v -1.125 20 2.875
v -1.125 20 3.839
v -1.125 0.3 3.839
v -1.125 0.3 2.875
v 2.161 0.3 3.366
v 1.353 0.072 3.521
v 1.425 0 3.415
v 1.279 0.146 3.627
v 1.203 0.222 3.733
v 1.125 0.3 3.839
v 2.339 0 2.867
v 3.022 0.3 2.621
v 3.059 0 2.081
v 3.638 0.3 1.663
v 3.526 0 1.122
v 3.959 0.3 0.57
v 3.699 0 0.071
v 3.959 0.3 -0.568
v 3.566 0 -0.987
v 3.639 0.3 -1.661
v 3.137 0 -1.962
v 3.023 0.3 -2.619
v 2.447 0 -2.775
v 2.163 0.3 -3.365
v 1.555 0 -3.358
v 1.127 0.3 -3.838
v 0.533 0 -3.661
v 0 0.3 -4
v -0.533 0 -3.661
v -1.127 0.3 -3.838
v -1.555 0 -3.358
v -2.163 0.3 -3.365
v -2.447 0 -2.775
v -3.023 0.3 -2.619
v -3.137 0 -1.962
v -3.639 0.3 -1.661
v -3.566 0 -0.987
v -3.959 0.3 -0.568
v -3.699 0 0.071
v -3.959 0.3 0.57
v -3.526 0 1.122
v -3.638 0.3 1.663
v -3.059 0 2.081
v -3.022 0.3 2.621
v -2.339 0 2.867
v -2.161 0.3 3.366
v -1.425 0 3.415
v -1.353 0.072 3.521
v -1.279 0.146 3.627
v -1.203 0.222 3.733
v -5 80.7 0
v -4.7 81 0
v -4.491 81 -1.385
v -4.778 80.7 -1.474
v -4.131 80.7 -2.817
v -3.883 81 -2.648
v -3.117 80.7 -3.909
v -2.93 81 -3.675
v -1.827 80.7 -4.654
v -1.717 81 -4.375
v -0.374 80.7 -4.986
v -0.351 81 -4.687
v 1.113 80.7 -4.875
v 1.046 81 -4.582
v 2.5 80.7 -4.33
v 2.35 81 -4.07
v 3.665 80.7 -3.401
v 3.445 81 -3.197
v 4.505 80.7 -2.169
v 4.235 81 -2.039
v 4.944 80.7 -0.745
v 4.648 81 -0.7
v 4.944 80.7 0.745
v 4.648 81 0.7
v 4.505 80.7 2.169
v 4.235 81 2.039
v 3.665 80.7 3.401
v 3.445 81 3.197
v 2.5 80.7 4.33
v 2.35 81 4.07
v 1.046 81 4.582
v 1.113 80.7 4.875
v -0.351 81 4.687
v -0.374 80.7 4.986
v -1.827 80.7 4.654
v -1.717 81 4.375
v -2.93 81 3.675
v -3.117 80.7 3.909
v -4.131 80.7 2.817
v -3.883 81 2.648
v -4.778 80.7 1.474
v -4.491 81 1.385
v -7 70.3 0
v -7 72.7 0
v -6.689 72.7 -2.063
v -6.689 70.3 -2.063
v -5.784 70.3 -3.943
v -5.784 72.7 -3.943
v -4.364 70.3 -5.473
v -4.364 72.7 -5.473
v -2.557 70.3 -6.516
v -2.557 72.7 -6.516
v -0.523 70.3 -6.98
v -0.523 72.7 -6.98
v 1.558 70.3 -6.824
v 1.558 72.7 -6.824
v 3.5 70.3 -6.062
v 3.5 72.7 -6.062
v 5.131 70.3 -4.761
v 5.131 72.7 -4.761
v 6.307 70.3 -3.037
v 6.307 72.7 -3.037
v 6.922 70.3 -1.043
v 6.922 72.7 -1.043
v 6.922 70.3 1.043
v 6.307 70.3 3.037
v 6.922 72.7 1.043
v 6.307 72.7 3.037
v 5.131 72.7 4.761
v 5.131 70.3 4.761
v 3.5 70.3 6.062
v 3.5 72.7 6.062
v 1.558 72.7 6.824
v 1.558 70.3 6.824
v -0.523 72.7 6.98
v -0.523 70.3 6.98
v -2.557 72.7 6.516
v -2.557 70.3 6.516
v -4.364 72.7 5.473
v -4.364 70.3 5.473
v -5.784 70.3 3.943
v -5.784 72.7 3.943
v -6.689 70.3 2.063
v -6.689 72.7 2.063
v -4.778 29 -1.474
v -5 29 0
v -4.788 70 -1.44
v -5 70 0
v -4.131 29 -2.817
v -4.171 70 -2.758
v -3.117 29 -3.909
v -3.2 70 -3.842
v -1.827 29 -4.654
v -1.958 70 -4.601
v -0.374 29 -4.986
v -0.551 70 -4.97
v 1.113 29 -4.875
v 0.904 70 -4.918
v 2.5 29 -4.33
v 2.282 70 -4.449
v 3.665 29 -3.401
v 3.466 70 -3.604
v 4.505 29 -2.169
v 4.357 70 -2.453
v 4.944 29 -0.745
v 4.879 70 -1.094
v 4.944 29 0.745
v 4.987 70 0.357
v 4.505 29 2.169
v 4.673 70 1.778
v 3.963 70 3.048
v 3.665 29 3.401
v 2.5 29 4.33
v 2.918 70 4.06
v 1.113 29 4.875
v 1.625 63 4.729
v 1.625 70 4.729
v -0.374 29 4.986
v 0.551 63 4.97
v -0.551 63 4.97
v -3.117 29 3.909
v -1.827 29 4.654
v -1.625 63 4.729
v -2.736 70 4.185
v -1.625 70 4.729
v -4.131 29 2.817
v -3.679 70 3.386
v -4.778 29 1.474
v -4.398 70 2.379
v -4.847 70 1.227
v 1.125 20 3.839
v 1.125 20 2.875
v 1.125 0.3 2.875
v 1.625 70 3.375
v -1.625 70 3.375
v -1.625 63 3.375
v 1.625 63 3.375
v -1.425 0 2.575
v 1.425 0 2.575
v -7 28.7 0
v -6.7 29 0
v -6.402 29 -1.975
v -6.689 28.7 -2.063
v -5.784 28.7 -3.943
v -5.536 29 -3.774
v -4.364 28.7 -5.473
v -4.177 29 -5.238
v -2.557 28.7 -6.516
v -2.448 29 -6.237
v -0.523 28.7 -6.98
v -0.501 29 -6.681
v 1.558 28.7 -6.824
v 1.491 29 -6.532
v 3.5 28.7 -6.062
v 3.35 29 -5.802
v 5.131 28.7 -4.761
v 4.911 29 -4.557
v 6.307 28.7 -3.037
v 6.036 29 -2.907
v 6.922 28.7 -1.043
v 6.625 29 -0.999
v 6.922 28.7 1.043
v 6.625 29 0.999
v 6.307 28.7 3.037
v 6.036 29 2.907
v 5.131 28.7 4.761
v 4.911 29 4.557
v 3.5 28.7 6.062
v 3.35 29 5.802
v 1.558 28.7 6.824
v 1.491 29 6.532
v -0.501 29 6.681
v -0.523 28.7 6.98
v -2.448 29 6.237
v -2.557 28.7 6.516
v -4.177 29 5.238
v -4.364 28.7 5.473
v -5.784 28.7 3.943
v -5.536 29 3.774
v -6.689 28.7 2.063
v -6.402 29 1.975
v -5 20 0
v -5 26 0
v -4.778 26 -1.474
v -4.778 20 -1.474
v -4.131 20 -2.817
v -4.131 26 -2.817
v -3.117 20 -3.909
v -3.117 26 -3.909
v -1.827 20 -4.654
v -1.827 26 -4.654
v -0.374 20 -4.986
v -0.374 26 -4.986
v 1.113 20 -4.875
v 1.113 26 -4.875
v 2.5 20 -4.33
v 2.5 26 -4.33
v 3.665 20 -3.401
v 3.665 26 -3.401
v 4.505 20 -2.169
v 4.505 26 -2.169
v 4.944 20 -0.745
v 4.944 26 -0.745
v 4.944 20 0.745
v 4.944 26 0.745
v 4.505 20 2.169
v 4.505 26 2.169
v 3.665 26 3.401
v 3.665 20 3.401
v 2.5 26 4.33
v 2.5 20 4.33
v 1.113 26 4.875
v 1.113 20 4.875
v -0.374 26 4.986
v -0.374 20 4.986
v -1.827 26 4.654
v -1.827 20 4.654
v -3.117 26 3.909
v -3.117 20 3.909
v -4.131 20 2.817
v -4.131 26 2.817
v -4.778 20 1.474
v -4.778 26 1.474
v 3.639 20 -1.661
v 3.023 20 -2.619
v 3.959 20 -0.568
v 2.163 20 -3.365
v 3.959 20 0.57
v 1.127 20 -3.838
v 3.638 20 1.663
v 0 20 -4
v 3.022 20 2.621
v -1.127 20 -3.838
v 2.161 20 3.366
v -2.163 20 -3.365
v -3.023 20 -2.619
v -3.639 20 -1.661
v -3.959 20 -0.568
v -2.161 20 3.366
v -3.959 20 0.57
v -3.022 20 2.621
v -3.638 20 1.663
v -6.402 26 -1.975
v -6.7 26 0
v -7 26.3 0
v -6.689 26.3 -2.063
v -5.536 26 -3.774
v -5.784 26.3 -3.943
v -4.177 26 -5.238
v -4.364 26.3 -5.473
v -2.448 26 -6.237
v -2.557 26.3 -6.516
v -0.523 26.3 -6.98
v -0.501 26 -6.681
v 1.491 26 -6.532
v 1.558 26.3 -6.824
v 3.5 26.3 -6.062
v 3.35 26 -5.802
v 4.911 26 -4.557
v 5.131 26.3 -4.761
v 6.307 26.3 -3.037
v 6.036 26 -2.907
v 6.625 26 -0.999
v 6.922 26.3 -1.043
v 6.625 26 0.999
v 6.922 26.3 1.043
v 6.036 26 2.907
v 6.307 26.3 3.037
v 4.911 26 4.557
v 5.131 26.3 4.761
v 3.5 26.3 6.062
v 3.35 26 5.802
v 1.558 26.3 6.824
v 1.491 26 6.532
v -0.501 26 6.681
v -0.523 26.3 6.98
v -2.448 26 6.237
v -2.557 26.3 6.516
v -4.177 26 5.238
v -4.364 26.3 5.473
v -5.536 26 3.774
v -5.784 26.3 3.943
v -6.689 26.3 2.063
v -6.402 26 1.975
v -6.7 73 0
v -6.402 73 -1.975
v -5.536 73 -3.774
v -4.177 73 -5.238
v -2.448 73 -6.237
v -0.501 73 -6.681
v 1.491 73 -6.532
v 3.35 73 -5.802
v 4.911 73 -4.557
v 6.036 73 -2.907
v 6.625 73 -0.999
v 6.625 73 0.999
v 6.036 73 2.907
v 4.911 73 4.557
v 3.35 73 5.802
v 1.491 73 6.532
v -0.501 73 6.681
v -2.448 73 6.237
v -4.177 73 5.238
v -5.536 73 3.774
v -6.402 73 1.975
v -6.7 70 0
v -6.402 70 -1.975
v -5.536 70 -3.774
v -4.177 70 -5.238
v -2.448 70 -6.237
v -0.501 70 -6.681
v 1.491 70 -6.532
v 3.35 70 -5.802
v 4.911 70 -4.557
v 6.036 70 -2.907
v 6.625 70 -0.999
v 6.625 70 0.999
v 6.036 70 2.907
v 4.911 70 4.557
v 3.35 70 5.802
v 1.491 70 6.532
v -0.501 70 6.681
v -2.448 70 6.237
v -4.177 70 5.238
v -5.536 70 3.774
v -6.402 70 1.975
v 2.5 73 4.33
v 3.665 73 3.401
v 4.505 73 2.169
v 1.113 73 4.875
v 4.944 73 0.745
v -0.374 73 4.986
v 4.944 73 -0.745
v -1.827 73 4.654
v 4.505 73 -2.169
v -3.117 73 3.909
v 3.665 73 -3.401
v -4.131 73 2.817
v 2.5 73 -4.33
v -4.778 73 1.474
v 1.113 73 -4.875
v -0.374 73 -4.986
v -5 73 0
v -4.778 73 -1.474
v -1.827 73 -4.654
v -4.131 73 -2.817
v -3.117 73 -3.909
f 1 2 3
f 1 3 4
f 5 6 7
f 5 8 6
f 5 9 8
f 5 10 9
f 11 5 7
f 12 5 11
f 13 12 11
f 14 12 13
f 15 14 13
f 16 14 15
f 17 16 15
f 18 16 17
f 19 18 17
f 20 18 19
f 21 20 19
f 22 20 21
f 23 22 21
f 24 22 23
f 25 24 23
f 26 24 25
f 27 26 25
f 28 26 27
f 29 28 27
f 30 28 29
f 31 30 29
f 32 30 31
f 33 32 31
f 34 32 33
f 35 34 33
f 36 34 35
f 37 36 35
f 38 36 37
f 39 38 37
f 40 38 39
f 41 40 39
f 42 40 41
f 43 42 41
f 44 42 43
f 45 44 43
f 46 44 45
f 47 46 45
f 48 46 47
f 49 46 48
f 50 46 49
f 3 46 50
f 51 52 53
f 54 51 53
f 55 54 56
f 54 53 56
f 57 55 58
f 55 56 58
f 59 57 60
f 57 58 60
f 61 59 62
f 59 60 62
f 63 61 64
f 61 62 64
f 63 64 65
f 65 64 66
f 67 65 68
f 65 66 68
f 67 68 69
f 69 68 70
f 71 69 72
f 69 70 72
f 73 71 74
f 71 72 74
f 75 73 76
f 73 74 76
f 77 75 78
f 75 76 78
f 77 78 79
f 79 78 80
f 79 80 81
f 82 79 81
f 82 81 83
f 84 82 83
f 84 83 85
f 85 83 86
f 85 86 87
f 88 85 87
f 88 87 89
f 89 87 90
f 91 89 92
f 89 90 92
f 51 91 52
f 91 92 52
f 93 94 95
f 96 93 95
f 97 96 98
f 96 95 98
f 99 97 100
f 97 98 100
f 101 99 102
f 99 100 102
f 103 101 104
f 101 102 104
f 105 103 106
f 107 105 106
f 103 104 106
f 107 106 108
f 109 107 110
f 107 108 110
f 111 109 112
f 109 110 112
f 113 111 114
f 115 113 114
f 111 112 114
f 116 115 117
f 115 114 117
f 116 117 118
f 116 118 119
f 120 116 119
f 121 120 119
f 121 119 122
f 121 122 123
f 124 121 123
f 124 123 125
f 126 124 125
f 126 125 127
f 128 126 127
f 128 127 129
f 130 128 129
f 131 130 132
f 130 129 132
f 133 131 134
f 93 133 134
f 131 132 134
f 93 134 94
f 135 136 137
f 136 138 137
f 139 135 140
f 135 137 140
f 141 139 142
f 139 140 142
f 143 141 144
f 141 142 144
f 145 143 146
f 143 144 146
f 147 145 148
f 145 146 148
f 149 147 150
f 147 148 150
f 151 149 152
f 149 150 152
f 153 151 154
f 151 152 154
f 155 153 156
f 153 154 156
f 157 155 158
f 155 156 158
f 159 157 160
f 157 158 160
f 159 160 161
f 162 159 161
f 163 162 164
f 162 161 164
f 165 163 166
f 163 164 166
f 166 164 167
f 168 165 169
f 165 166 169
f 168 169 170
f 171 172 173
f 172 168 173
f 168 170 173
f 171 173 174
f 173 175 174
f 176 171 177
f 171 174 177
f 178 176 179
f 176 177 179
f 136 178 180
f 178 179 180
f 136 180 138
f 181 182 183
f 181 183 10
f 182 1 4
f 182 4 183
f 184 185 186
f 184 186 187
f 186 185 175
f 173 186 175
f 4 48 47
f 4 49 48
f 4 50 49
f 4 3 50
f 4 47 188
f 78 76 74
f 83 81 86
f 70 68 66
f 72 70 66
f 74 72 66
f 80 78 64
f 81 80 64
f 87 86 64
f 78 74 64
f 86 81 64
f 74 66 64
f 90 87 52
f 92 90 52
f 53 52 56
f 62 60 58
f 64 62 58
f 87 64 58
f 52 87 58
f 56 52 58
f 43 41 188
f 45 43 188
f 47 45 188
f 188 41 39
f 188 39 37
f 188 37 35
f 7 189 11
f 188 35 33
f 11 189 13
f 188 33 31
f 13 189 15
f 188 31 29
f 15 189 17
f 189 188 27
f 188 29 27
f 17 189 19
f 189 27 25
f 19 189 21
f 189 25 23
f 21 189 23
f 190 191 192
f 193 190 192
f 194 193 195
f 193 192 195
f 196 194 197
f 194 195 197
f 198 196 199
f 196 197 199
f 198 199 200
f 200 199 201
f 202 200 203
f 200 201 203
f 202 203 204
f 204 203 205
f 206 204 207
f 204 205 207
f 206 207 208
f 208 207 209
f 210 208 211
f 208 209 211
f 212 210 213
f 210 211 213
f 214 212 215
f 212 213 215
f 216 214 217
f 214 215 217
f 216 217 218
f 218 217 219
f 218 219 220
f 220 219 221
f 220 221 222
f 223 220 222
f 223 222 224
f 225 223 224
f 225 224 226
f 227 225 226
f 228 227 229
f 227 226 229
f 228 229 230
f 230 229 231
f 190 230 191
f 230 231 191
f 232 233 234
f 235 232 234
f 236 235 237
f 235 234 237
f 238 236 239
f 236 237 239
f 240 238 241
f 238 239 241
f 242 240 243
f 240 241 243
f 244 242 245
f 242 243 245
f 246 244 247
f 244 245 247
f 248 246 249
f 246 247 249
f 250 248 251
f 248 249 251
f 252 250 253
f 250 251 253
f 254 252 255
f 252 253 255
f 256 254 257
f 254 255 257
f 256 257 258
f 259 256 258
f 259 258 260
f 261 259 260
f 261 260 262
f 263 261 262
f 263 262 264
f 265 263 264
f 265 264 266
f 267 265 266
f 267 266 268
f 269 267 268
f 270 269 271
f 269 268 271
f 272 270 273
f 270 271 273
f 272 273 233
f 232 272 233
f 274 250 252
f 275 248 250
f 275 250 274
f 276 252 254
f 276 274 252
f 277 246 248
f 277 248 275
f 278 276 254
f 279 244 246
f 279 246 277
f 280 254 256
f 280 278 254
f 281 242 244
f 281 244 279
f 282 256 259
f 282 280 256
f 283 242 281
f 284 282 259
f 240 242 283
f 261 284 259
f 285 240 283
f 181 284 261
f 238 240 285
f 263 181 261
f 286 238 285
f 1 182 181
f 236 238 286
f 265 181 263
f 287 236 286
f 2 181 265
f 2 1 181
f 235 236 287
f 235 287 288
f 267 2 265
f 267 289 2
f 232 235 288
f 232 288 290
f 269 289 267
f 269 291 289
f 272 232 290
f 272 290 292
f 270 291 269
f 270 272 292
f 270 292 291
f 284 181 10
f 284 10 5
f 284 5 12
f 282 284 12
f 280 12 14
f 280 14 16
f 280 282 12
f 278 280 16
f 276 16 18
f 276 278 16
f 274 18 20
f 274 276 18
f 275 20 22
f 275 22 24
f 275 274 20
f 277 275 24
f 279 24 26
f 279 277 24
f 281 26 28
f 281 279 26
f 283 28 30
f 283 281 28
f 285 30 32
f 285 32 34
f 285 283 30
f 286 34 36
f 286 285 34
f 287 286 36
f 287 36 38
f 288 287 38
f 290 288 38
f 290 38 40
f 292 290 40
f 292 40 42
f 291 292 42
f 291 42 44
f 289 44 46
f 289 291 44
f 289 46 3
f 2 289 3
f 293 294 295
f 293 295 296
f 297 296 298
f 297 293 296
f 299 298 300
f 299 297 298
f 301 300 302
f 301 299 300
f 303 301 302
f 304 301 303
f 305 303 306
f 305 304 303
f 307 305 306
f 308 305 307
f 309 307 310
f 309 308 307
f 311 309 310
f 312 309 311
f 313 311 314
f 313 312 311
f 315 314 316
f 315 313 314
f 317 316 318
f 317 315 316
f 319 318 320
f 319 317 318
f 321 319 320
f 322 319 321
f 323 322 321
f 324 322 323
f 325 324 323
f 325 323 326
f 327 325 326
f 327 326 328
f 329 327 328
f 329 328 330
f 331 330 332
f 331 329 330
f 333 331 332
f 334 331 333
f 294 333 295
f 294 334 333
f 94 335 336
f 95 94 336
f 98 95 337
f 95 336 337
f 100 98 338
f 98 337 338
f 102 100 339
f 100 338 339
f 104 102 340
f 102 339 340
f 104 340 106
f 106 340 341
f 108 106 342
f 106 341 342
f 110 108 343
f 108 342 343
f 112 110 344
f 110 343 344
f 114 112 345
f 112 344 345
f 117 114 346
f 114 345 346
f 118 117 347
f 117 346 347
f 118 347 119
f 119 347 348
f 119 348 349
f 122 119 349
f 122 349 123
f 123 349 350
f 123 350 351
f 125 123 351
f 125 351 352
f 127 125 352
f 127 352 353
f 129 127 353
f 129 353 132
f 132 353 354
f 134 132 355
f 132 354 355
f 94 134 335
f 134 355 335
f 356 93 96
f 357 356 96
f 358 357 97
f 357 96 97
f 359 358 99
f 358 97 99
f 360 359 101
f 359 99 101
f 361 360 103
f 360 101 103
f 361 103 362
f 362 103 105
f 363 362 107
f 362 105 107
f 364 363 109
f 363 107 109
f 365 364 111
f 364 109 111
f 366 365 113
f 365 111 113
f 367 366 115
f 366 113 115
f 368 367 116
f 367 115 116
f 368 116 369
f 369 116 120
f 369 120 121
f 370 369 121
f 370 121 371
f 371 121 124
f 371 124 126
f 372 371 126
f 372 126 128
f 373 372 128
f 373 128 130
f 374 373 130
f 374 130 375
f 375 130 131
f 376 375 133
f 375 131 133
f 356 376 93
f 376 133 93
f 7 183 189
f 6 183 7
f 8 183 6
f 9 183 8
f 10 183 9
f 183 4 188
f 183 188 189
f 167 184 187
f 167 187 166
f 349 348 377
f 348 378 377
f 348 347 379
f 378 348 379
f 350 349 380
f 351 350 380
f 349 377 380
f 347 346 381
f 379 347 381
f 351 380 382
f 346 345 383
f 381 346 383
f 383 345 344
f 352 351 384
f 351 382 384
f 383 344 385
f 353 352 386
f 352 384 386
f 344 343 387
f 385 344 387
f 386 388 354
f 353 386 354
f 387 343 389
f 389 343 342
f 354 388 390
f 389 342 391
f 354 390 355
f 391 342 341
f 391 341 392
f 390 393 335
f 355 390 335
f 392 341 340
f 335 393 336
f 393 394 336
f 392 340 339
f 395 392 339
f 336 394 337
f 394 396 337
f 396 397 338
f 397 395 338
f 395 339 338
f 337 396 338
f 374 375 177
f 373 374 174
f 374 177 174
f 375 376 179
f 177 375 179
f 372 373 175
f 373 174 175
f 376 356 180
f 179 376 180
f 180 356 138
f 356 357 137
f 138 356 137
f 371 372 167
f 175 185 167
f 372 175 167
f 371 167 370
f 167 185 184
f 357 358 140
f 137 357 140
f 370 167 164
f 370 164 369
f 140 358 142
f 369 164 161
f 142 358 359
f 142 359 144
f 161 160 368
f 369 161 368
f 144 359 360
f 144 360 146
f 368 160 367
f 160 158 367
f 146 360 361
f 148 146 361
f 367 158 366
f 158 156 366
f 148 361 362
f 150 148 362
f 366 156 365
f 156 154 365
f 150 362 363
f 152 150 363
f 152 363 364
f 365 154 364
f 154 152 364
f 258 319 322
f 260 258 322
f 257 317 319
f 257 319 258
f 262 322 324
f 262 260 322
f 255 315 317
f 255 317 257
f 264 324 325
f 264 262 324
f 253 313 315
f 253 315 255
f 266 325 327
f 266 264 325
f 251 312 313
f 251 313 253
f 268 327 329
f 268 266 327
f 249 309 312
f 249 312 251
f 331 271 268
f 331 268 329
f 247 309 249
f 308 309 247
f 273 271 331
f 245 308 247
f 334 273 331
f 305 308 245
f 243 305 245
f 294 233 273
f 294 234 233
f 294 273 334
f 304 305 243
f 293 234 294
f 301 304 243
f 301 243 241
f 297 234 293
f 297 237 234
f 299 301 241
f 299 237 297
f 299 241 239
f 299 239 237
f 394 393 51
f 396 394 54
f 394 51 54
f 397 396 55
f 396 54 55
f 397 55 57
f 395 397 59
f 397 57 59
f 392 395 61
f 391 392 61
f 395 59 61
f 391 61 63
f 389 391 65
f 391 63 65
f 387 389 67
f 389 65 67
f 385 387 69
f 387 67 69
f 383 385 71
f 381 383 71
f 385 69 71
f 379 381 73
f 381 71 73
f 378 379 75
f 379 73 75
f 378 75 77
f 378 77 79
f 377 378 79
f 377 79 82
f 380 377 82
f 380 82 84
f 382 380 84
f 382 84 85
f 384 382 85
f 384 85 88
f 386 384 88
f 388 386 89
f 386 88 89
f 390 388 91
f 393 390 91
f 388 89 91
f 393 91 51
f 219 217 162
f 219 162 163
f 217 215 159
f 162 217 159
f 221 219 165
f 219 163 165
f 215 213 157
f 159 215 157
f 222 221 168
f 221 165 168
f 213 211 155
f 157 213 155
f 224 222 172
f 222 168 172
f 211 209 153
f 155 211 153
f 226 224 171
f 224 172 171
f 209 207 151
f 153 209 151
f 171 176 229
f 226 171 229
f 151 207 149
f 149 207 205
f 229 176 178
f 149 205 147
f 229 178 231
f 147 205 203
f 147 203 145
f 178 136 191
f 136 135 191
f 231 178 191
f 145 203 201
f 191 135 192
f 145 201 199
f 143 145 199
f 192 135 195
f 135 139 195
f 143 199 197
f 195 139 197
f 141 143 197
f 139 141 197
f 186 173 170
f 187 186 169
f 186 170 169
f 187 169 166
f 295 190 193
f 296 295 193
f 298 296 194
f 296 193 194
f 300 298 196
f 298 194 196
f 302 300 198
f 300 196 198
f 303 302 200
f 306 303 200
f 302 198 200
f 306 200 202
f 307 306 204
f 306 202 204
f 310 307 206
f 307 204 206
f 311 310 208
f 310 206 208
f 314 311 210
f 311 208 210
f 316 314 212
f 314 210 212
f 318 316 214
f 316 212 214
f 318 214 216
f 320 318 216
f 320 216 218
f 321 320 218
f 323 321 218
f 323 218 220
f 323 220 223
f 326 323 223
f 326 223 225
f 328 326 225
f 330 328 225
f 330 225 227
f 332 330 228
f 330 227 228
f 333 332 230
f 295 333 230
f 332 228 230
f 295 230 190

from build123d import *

# Parameters (mm, degrees)
SKETCH2_W           = 3.25
SKETCH2_H           = 3.25
CUT_EXTRUDE1_DEPTH  = 7
SKETCH3_R           = 6.416941782
CUT_EXTRUDE2_DEPTH  = 20
CHAMFER1_SIZE       = 0.3
BOSS_EXTRUDE1_START = -3
SKETCH5_R           = 7
BOSS_EXTRUDE1_DEPTH = 3
CHAMFER2_SIZE       = 0.3


with BuildPart() as part:
    # Sketch1 → Revolve1 (revolve)
    with BuildSketch(Plane.XY):
        Polygon((0, 0), (5, 0), (5, 70), (7, 70), (7, 73), (5, 73), (5, 81), (0, 81), align=None)
    revolve(axis=Axis((0, 81, 0), (0, -1, 0)))

    # Sketch2 → Cut-Extrude1 (cut)
    with BuildSketch(Plane.XZ.offset(-70)):
        with Locations((0, 5)):
            Rectangle(SKETCH2_W, SKETCH2_H)
    extrude(amount=CUT_EXTRUDE1_DEPTH, mode=Mode.SUBTRACT)

    # Sketch3 → Cut-Extrude2 (cut)
    with BuildSketch(Plane.XZ):
        Circle(SKETCH3_R)
        with BuildLine():
            ThreePointArc((1.125, 3.838538133), (0, -4), (-1.125, 3.838538133))
            Line((-1.125, 3.838538133), (-1.125, 2.875))
            Line((-1.125, 2.875), (1.125, 2.875))
            Line((1.125, 2.875), (1.125, 3.838538133))
        make_face(mode=Mode.SUBTRACT)
    extrude(amount=-CUT_EXTRUDE2_DEPTH, mode=Mode.SUBTRACT)

    # Chamfer1
    chamfer1_edges = [part.edges().sort_by_distance(p)[0] for p in [
        (-5, 81, 0),
        (-7, 70, 0),
        (-7, 73, 0),
        (-1.125, 0, 3.356769067),
        (0, 0, 2.875),
        (1.125, 0, 3.356769067),
        (0, 0, -4),
    ]]
    chamfer(chamfer1_edges, length=CHAMFER1_SIZE)

    # Sketch5 → Boss-Extrude1 (add)
    with BuildSketch(Plane(origin=(0, 26, 0), x_dir=(-1, 0, 0), z_dir=(0, -1, 0)).offset(BOSS_EXTRUDE1_START)):
        Circle(SKETCH5_R)
    extrude(amount=BOSS_EXTRUDE1_DEPTH)

    # Chamfer2
    chamfer2_edges = [part.edges().sort_by_distance(p)[0] for p in [
        (7, 26, 0),
        (7, 29, 0),
    ]]
    chamfer(chamfer2_edges, length=CHAMFER2_SIZE)


solid = part.part
